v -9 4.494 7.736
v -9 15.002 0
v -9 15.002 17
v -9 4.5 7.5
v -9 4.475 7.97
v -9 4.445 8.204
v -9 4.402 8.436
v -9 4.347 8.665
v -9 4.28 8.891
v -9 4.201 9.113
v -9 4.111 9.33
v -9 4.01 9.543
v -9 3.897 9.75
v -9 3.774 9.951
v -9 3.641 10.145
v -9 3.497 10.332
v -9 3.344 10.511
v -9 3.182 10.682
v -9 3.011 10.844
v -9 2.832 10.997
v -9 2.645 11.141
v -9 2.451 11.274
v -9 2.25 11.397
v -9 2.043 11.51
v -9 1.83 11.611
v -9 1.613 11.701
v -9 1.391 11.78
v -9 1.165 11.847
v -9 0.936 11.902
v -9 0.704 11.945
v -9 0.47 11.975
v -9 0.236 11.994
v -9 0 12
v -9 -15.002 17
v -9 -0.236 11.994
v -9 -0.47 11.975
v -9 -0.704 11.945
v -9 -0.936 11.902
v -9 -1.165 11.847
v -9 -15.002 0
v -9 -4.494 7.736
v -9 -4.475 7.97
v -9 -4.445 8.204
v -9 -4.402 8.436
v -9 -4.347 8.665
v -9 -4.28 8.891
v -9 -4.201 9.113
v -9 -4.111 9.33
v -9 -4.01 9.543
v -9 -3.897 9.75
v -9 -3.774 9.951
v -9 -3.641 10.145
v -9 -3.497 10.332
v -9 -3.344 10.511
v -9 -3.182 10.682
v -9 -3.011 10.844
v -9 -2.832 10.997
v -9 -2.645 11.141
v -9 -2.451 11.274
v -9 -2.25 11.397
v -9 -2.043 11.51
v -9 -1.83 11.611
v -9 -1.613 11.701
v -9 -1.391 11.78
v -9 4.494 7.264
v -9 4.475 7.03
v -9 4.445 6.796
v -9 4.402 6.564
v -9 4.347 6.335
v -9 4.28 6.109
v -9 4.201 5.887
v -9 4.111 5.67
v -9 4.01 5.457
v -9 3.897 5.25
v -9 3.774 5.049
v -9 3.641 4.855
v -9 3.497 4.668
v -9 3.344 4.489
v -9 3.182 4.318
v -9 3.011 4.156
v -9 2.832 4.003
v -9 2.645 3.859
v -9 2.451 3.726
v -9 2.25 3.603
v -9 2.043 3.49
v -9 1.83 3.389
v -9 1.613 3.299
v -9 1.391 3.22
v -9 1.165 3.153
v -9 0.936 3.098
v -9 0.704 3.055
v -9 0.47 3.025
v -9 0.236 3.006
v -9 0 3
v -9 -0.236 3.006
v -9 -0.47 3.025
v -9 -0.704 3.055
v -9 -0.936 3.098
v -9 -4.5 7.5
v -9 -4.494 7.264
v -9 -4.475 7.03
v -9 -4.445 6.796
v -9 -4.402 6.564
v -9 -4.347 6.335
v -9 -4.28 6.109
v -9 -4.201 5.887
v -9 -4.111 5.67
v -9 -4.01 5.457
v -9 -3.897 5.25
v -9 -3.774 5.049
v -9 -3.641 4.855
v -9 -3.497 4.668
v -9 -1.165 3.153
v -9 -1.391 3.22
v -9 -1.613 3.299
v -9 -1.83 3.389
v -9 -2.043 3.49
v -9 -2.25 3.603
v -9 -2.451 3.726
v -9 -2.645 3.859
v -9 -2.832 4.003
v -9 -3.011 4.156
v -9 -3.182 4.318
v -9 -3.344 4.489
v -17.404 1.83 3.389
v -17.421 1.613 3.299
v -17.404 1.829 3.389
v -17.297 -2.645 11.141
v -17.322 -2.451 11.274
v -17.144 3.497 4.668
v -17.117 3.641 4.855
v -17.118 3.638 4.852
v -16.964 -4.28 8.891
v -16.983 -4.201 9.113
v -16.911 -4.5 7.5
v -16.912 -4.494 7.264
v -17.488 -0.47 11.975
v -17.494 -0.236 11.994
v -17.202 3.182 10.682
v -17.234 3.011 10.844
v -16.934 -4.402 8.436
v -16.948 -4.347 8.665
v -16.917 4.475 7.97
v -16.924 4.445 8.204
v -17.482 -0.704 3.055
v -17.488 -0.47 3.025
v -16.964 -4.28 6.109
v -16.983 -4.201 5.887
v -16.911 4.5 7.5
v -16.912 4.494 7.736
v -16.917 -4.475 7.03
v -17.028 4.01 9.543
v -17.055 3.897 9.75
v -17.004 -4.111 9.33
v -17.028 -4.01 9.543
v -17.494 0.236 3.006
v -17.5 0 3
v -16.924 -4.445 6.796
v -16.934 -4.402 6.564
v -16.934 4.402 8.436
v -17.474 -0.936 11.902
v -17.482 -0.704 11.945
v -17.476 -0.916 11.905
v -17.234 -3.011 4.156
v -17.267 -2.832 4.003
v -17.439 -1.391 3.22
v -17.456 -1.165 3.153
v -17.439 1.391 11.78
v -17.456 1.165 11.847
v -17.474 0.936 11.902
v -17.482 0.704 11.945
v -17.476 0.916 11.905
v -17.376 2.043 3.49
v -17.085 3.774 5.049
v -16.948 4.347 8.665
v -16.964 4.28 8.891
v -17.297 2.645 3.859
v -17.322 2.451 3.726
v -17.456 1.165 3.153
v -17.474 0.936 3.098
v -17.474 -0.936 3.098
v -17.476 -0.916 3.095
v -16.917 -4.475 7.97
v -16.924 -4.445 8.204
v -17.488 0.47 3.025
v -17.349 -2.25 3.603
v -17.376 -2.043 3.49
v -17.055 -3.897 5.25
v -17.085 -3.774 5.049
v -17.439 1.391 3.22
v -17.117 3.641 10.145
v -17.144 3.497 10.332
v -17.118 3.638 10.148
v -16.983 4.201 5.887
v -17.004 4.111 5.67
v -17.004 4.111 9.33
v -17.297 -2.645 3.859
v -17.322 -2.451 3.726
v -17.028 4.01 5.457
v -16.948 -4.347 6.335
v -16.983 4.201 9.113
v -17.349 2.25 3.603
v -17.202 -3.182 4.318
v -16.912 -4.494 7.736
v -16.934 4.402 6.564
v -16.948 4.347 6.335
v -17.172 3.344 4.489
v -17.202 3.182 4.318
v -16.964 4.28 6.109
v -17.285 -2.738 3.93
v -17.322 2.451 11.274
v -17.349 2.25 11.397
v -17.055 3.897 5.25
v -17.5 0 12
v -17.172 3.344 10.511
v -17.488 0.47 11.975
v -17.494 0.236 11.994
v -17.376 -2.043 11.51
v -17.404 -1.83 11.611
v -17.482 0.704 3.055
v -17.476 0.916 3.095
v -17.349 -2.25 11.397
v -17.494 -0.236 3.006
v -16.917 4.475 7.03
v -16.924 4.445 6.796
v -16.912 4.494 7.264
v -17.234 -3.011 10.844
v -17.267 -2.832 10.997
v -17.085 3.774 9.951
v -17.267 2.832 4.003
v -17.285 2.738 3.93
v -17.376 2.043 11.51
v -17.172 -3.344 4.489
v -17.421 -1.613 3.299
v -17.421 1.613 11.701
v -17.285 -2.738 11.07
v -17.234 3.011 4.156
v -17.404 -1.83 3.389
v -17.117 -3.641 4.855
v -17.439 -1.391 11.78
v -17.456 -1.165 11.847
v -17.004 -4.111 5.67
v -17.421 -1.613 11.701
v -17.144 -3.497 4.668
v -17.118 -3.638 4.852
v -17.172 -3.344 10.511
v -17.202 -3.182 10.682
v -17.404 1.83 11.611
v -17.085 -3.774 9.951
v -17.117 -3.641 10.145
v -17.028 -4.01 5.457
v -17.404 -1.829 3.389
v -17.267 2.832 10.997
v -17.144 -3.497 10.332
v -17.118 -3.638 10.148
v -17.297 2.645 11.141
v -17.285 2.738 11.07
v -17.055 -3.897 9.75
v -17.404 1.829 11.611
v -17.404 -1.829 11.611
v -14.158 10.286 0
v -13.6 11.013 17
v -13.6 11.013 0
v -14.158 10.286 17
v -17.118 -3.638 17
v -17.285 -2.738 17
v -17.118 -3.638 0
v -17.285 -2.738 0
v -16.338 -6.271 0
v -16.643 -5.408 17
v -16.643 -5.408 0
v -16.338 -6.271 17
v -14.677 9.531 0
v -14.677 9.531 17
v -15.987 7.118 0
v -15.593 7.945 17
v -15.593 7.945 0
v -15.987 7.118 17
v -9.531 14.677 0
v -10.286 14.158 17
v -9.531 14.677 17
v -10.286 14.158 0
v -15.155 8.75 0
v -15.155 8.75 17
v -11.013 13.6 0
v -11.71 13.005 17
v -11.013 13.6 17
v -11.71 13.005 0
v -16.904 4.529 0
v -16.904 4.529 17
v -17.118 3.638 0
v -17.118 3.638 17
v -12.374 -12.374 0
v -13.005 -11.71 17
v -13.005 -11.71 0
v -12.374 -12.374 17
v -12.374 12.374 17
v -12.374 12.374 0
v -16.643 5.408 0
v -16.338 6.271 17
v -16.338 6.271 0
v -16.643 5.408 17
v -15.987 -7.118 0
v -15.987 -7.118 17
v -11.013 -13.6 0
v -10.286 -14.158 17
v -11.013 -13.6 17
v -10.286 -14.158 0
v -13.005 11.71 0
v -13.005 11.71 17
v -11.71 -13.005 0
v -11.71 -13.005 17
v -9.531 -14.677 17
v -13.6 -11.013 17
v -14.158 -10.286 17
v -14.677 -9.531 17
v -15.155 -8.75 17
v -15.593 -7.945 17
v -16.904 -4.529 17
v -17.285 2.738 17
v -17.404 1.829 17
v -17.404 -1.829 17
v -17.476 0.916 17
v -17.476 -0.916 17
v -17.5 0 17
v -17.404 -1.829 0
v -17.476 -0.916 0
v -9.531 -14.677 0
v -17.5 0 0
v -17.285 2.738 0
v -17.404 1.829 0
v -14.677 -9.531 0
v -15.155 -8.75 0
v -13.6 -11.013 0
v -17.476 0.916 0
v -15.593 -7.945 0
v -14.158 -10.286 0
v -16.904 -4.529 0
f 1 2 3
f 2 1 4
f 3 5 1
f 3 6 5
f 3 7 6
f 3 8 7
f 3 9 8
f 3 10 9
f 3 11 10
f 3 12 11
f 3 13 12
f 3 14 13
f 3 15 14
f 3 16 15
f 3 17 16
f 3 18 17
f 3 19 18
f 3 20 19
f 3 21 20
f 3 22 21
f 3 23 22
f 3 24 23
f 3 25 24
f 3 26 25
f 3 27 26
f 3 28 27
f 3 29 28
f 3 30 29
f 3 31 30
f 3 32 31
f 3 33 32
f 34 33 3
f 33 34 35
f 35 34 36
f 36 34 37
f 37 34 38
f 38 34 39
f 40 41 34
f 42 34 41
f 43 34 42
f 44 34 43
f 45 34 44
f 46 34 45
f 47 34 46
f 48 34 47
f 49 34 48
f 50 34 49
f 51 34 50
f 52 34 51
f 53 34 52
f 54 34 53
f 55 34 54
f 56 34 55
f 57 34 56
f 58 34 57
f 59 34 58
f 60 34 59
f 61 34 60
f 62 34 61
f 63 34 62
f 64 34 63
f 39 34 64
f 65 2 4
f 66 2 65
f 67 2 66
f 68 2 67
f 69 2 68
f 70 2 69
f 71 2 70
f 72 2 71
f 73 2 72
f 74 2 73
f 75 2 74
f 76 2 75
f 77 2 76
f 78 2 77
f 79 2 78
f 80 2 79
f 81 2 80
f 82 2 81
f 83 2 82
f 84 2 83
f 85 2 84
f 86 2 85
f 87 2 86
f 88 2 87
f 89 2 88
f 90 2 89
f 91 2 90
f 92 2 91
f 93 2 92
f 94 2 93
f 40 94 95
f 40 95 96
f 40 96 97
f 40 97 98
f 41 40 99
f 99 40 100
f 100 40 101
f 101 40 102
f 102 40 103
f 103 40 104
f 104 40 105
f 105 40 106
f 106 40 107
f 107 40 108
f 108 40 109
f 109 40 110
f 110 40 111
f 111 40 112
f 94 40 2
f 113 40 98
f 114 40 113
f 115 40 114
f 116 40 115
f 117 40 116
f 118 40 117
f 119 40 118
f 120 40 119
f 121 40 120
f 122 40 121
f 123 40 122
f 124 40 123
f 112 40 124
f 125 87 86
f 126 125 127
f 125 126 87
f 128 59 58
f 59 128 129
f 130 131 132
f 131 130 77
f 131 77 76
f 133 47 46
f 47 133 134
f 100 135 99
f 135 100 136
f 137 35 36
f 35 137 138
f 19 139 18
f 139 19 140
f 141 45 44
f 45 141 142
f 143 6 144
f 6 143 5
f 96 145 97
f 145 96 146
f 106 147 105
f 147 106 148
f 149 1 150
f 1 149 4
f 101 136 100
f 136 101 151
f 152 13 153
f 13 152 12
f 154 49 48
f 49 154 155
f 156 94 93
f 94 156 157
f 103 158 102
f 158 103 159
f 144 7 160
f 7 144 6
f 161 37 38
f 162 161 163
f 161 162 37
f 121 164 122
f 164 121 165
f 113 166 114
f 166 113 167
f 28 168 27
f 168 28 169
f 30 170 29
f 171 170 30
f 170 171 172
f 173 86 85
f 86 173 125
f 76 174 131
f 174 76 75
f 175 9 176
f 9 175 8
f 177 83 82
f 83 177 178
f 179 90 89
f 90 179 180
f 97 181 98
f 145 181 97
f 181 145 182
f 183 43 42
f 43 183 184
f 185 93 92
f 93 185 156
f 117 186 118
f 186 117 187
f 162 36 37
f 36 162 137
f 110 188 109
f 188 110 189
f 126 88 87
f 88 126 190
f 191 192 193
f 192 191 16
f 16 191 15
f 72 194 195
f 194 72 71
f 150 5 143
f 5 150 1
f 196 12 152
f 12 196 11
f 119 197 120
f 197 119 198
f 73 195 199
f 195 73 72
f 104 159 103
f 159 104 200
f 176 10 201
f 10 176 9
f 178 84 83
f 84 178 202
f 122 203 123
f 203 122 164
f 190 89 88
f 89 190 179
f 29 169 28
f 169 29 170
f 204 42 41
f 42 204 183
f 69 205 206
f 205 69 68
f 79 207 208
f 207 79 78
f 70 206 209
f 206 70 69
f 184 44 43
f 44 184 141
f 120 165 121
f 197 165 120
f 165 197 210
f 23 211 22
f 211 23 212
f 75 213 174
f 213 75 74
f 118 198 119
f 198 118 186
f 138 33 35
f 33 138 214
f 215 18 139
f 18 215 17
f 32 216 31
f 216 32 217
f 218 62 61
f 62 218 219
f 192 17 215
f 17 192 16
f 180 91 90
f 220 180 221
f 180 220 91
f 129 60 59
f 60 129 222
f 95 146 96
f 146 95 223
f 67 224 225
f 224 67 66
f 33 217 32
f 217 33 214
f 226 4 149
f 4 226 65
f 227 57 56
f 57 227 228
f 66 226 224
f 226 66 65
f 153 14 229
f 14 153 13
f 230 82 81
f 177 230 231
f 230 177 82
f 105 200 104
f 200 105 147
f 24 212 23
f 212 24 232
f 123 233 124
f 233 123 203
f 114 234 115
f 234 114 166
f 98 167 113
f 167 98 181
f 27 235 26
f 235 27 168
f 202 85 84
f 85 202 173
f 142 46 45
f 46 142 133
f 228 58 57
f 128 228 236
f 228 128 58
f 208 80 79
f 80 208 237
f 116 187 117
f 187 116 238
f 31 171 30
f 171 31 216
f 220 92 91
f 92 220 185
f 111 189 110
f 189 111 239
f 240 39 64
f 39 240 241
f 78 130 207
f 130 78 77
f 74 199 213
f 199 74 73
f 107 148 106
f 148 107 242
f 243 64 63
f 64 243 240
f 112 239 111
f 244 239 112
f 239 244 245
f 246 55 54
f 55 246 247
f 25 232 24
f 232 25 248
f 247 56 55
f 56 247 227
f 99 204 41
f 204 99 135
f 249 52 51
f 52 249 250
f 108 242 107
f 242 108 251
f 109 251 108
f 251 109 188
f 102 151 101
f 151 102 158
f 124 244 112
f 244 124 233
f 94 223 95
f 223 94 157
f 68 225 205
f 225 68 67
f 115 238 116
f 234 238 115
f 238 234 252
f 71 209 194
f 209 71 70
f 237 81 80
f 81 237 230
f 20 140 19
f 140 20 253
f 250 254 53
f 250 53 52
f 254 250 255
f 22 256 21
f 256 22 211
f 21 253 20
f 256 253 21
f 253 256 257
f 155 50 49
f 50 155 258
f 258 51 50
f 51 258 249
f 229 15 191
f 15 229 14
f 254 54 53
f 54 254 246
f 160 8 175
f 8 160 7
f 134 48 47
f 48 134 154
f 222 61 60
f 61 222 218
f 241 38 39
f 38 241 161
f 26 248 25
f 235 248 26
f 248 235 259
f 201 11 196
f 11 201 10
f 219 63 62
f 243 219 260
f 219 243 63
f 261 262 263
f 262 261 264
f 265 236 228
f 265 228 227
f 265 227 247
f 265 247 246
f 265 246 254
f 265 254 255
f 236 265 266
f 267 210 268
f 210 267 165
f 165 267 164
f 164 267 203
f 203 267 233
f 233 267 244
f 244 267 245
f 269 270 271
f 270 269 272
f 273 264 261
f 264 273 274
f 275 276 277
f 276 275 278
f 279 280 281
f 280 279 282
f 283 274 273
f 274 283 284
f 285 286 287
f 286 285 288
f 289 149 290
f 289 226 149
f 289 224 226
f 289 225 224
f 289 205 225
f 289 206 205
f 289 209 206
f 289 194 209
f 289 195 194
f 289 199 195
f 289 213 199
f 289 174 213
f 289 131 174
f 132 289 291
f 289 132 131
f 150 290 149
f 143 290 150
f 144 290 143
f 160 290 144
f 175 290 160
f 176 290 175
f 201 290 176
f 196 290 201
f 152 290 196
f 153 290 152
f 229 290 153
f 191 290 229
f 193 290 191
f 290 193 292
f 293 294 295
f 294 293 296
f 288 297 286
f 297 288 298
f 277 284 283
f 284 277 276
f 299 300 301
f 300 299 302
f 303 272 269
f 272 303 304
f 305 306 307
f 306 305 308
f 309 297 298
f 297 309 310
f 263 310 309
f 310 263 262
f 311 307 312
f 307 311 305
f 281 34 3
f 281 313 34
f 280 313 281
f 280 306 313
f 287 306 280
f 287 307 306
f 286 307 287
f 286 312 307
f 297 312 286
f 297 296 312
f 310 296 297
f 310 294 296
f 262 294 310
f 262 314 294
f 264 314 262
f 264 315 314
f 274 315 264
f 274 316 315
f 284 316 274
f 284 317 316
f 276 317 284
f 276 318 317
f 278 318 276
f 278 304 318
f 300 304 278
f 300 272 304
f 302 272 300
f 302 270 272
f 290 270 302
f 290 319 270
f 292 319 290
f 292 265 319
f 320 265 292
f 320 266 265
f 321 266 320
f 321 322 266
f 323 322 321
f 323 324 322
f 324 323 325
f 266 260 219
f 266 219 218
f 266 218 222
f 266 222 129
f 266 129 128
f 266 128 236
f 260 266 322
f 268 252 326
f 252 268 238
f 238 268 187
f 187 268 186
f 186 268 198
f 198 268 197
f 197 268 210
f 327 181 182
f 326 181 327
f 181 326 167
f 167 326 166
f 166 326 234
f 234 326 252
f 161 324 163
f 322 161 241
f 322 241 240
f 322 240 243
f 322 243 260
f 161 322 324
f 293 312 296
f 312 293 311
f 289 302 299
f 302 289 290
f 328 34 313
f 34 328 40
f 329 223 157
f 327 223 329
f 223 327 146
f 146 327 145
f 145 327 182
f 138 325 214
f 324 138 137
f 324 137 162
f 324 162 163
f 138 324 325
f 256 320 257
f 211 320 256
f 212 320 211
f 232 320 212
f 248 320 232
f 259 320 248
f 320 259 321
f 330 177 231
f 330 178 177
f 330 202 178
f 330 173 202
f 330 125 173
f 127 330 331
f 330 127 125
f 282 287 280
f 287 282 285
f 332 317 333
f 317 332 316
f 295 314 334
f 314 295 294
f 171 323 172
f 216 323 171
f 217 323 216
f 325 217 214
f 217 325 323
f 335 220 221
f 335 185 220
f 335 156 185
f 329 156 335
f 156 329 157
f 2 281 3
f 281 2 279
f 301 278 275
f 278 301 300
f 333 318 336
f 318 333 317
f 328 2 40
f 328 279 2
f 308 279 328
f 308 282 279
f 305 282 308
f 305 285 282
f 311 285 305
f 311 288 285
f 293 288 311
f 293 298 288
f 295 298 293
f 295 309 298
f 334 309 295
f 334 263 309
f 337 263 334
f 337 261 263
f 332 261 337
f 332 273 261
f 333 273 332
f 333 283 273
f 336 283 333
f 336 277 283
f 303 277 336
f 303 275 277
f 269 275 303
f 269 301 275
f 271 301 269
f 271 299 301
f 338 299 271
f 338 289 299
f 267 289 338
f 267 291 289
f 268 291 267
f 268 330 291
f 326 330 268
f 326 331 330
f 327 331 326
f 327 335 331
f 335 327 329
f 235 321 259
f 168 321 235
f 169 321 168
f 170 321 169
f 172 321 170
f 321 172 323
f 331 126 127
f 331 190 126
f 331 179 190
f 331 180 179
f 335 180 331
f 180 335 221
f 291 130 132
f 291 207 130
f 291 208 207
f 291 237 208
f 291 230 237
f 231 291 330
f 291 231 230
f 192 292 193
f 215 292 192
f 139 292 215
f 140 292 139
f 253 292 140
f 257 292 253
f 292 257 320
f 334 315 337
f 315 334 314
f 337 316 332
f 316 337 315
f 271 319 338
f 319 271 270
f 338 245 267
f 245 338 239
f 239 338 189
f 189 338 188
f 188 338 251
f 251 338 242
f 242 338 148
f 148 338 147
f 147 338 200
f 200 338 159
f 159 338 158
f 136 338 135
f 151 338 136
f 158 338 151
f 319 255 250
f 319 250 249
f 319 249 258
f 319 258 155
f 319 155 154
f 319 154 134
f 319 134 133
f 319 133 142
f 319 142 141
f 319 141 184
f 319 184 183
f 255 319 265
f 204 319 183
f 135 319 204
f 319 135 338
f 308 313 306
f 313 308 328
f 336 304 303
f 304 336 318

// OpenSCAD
difference() {
    cylinder(h=17,d=35,$fn=120,center=false);
    union()  {
        translate([-9,-17.5,-1]) cube([35,35,19]);
        translate([0,0,7.5]) rotate([0,90,0]) cylinder(h=60,d=9,$fn=120,center=true);
    }
}
